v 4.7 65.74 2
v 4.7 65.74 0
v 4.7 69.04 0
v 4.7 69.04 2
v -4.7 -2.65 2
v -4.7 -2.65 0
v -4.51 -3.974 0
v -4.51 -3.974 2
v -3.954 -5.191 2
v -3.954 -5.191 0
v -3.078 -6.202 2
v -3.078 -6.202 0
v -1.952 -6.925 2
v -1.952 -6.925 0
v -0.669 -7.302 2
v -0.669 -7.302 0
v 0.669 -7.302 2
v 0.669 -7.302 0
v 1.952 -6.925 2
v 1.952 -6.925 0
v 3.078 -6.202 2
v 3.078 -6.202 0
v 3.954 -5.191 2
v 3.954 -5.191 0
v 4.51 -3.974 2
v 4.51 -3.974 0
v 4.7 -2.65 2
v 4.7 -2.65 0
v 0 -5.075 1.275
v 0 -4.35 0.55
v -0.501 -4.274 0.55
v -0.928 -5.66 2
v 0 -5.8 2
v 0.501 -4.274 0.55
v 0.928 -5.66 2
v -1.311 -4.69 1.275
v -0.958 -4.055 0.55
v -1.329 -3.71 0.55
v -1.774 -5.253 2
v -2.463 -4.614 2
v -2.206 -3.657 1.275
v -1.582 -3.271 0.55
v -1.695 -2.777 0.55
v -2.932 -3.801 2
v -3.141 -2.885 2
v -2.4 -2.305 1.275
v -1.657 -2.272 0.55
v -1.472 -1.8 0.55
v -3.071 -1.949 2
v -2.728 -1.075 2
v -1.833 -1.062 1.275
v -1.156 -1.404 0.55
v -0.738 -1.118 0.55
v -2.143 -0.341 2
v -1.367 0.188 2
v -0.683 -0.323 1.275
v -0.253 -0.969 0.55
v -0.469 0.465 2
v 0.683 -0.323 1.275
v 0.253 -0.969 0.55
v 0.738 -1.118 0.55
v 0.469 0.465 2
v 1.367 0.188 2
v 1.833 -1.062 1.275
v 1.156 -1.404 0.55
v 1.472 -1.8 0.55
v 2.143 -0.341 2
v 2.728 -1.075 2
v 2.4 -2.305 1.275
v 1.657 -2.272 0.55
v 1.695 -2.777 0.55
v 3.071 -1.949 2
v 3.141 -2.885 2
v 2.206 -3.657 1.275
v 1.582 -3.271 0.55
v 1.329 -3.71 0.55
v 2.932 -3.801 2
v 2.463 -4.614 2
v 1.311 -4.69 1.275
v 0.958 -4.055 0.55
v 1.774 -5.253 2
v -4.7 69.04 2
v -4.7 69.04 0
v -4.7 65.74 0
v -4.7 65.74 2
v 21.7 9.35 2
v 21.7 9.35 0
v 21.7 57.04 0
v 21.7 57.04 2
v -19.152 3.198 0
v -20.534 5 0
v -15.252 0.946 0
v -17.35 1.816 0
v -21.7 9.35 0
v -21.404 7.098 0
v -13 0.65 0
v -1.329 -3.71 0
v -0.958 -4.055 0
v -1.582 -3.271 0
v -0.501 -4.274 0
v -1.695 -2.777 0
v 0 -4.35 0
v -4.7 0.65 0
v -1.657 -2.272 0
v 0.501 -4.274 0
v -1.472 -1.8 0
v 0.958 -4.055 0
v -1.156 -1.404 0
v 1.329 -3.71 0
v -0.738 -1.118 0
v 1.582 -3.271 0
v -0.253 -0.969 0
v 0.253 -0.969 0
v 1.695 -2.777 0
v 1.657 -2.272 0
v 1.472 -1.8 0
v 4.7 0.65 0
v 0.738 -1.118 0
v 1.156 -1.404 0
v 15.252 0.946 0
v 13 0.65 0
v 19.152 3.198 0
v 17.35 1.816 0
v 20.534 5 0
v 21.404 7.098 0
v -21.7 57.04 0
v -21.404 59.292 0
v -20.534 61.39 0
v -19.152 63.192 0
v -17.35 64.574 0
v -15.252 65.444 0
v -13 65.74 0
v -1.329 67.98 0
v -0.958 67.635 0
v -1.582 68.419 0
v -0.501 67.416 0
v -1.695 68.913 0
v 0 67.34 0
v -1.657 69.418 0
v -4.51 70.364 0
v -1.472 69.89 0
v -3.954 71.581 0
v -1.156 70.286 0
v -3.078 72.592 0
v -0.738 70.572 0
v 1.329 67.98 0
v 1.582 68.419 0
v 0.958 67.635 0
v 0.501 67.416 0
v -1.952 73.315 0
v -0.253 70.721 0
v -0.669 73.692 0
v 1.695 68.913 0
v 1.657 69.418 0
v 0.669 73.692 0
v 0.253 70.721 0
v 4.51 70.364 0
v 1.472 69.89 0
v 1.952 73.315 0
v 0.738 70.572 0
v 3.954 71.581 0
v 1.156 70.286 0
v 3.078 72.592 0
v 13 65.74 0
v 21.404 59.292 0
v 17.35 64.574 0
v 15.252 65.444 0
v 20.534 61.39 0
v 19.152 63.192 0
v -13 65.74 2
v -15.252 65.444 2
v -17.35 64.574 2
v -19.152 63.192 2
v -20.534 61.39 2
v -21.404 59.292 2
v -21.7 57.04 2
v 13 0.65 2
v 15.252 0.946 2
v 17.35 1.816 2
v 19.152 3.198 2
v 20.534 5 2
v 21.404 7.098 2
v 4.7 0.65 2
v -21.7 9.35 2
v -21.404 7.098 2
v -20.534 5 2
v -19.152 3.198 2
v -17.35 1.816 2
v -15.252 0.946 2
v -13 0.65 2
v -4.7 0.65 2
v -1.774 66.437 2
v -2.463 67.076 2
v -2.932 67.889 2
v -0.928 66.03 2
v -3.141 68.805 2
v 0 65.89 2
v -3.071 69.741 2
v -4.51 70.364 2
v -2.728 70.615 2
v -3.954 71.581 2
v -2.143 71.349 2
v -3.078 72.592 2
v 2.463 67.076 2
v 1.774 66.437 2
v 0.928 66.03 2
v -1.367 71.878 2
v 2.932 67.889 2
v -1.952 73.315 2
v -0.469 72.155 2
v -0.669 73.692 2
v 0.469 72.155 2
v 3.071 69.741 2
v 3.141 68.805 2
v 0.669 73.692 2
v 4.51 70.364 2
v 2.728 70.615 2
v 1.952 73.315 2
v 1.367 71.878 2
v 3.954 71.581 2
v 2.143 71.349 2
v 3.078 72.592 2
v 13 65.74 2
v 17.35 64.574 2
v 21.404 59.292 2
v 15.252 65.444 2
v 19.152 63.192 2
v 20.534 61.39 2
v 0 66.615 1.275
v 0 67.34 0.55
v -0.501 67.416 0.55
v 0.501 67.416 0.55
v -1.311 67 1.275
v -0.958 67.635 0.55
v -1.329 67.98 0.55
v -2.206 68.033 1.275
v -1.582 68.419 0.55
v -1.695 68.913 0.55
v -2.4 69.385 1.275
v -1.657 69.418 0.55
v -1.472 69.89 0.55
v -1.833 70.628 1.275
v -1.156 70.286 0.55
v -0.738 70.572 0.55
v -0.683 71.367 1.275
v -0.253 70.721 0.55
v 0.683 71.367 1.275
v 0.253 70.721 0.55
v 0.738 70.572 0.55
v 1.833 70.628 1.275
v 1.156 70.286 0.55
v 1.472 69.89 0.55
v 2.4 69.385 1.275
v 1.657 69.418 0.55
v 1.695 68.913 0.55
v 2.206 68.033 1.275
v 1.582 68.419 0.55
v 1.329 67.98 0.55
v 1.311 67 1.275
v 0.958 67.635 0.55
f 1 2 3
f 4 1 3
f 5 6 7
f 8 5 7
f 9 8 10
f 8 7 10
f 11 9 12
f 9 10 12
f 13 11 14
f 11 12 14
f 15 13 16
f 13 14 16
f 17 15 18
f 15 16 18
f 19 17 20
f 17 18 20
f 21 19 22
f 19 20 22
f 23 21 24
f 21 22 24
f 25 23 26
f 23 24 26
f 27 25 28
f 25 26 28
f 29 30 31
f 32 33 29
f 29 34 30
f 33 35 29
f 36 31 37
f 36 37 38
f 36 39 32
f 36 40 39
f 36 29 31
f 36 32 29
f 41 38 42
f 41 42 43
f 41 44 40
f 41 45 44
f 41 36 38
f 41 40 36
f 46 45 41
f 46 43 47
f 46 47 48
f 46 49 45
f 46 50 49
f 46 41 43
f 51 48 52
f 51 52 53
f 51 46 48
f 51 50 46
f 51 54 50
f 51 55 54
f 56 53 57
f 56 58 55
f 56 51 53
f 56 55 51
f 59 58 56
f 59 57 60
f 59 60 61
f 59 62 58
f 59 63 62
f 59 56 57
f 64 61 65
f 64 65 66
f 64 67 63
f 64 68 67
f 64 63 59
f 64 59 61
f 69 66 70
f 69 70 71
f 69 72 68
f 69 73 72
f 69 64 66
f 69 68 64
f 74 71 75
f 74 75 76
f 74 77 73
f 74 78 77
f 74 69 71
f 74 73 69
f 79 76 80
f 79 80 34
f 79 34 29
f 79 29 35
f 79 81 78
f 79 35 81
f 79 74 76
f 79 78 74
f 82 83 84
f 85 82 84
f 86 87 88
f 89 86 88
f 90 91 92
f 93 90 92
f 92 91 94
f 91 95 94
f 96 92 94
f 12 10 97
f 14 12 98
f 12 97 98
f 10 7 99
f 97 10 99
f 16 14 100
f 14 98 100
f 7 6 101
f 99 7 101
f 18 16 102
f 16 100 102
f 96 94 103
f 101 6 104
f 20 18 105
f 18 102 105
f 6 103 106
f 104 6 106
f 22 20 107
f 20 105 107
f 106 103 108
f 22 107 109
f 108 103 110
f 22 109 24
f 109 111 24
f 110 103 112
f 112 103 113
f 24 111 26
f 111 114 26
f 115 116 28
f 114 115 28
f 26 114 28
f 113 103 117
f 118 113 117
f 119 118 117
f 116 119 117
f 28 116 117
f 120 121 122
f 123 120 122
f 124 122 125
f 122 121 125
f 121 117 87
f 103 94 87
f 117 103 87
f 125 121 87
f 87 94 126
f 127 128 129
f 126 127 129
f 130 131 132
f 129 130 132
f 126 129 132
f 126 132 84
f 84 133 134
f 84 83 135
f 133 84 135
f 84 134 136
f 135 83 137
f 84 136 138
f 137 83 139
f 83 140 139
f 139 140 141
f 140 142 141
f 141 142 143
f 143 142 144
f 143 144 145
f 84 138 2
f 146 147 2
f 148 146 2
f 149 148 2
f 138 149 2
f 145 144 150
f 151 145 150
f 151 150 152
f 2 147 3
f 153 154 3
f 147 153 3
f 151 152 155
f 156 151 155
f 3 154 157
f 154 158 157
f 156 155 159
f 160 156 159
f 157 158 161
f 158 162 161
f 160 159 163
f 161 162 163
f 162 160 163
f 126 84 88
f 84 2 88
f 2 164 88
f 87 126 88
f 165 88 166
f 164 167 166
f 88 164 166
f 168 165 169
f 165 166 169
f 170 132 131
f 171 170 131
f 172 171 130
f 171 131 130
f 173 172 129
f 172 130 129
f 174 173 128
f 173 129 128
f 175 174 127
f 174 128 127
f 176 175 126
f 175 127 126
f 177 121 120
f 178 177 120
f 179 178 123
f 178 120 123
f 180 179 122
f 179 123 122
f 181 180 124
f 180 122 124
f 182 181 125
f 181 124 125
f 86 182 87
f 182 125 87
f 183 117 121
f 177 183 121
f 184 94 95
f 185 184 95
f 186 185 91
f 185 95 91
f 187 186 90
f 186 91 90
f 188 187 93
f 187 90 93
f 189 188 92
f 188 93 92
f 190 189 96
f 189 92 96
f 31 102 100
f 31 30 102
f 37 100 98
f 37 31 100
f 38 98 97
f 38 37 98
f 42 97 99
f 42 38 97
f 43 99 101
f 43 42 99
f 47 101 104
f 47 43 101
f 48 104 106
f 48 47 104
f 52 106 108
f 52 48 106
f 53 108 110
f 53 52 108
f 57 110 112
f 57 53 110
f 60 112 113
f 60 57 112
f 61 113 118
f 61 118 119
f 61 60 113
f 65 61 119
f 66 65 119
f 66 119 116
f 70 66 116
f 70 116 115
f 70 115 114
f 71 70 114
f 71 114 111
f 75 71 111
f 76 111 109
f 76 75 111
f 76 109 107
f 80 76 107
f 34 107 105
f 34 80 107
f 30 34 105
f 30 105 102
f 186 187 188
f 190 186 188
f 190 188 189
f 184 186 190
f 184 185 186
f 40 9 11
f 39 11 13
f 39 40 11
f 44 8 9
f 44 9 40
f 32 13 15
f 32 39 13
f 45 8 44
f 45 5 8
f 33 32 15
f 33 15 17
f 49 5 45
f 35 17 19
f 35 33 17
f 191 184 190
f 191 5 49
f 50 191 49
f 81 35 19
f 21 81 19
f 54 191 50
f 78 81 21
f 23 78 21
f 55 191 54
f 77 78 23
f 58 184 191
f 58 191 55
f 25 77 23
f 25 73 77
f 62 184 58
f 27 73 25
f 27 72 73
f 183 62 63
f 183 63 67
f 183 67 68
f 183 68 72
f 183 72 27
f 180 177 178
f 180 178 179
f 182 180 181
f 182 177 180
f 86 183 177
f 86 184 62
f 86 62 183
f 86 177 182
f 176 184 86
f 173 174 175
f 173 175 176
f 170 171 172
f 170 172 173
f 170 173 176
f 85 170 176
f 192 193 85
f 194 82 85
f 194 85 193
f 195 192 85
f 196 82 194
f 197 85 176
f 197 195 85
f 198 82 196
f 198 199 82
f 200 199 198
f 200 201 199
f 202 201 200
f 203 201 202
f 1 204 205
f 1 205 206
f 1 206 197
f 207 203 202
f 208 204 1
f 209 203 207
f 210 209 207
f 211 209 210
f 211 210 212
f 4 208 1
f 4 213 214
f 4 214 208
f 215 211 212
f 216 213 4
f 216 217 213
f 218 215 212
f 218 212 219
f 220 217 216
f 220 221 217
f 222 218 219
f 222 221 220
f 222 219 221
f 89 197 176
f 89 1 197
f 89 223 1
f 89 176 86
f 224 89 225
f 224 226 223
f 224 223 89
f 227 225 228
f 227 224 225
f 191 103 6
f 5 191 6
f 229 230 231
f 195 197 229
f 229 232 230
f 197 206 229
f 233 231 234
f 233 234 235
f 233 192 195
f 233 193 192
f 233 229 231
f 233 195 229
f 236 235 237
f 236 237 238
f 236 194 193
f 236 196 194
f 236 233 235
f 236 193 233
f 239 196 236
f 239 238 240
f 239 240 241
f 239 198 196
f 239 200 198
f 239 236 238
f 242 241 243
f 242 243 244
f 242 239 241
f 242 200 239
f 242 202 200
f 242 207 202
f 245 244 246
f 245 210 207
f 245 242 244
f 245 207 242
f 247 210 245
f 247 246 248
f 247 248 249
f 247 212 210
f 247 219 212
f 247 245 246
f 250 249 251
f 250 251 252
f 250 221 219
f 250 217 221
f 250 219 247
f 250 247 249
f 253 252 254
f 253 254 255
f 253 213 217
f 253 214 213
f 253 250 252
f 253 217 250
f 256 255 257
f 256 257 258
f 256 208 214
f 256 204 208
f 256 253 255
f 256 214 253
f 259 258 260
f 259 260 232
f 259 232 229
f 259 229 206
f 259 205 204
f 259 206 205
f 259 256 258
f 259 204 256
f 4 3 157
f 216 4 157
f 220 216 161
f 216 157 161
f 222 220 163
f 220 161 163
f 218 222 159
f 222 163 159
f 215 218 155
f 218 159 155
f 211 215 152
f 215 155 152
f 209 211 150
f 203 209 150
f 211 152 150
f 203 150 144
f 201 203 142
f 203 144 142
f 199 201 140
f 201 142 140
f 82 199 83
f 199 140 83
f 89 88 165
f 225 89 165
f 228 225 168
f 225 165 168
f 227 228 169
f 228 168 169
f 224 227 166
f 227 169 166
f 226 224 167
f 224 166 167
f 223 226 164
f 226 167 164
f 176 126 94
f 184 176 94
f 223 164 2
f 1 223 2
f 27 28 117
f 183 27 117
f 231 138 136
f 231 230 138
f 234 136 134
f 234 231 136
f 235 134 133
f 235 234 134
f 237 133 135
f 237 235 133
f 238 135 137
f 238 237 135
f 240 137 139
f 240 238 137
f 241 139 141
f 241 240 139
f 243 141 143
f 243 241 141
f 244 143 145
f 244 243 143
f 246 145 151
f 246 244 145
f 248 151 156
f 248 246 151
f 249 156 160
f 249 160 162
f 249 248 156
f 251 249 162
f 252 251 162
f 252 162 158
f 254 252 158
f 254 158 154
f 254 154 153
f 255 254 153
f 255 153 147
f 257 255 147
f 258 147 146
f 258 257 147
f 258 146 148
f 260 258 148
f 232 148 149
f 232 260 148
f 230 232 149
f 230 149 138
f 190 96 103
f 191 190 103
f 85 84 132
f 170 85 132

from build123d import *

# Parameters (mm, degrees)
BOSS_EXTRU_1_DEPTH                          = 2
FRAISAGE_POUR_VIS_T_TE_FRAIS_E_M31_AT_COUNT = 2
FRAISAGE_POUR_VIS_T_TE_FRAIS_E_M31_AT_PITCH = 71.69


with BuildPart() as part:
    # Esquisse1 → Boss.-Extru.1 (new body)
    with BuildSketch(Plane.XY):
        with BuildLine():
            Line((-4.7, 69.04), (-4.7, 65.74))
            Line((-4.7, 65.74), (-13, 65.74))
            ThreePointArc((-13, 65.74), (-19.151828996, 63.191828996), (-21.7, 57.04))
            Line((-21.7, 57.04), (-21.7, 9.35))
            ThreePointArc((-21.7, 9.35), (-19.151828996, 3.198171004), (-13, 0.65))
            Line((-13, 0.65), (-4.7, 0.65))
            Line((-4.7, 0.65), (-4.7, -2.65))
            ThreePointArc((-4.7, -2.65), (0, -7.35), (4.7, -2.65))
            Line((4.7, -2.65), (4.7, 0.65))
            Line((4.7, 0.65), (13, 0.65))
            ThreePointArc((13, 0.65), (19.151828996, 3.198171004), (21.7, 9.35))
            Line((21.7, 9.35), (21.7, 57.04))
            ThreePointArc((21.7, 57.04), (19.151828996, 63.191828996), (13, 65.74))
            Line((13, 65.74), (4.7, 65.74))
            Line((4.7, 65.74), (4.7, 69.04))
            ThreePointArc((4.7, 69.04), (0, 73.74), (-4.7, 69.04))
        make_face()
    extrude(amount=BOSS_EXTRU_1_DEPTH)

    # Esquisse4 → Fraisage pour vis à tête fraisée M31 (revolve, cut)
    with BuildSketch(Plane(origin=(0, 69.04, 2), x_dir=(0, -1, 0), z_dir=(1, 0, 0))):
        Polygon((0, 0), (0, 2), (1.7, 2), (1.7, 1.45), (3.15, 0), align=None)
    fraisage_pour_vis_t_te_frais_e_m31 = revolve(axis=Axis((0, 69.04, 8.35), (0, 0, -1)), mode=Mode.SUBTRACT)

    # Fraisage pour vis à tête fraisée M31 at: Fraisage pour vis à tête fraisée M31 ×2
    with Locations(*[(0, -i * FRAISAGE_POUR_VIS_T_TE_FRAIS_E_M31_AT_PITCH, 0) for i in range(1, FRAISAGE_POUR_VIS_T_TE_FRAIS_E_M31_AT_COUNT)]):
        add(fraisage_pour_vis_t_te_frais_e_m31, mode=Mode.SUBTRACT)


solid = part.part
